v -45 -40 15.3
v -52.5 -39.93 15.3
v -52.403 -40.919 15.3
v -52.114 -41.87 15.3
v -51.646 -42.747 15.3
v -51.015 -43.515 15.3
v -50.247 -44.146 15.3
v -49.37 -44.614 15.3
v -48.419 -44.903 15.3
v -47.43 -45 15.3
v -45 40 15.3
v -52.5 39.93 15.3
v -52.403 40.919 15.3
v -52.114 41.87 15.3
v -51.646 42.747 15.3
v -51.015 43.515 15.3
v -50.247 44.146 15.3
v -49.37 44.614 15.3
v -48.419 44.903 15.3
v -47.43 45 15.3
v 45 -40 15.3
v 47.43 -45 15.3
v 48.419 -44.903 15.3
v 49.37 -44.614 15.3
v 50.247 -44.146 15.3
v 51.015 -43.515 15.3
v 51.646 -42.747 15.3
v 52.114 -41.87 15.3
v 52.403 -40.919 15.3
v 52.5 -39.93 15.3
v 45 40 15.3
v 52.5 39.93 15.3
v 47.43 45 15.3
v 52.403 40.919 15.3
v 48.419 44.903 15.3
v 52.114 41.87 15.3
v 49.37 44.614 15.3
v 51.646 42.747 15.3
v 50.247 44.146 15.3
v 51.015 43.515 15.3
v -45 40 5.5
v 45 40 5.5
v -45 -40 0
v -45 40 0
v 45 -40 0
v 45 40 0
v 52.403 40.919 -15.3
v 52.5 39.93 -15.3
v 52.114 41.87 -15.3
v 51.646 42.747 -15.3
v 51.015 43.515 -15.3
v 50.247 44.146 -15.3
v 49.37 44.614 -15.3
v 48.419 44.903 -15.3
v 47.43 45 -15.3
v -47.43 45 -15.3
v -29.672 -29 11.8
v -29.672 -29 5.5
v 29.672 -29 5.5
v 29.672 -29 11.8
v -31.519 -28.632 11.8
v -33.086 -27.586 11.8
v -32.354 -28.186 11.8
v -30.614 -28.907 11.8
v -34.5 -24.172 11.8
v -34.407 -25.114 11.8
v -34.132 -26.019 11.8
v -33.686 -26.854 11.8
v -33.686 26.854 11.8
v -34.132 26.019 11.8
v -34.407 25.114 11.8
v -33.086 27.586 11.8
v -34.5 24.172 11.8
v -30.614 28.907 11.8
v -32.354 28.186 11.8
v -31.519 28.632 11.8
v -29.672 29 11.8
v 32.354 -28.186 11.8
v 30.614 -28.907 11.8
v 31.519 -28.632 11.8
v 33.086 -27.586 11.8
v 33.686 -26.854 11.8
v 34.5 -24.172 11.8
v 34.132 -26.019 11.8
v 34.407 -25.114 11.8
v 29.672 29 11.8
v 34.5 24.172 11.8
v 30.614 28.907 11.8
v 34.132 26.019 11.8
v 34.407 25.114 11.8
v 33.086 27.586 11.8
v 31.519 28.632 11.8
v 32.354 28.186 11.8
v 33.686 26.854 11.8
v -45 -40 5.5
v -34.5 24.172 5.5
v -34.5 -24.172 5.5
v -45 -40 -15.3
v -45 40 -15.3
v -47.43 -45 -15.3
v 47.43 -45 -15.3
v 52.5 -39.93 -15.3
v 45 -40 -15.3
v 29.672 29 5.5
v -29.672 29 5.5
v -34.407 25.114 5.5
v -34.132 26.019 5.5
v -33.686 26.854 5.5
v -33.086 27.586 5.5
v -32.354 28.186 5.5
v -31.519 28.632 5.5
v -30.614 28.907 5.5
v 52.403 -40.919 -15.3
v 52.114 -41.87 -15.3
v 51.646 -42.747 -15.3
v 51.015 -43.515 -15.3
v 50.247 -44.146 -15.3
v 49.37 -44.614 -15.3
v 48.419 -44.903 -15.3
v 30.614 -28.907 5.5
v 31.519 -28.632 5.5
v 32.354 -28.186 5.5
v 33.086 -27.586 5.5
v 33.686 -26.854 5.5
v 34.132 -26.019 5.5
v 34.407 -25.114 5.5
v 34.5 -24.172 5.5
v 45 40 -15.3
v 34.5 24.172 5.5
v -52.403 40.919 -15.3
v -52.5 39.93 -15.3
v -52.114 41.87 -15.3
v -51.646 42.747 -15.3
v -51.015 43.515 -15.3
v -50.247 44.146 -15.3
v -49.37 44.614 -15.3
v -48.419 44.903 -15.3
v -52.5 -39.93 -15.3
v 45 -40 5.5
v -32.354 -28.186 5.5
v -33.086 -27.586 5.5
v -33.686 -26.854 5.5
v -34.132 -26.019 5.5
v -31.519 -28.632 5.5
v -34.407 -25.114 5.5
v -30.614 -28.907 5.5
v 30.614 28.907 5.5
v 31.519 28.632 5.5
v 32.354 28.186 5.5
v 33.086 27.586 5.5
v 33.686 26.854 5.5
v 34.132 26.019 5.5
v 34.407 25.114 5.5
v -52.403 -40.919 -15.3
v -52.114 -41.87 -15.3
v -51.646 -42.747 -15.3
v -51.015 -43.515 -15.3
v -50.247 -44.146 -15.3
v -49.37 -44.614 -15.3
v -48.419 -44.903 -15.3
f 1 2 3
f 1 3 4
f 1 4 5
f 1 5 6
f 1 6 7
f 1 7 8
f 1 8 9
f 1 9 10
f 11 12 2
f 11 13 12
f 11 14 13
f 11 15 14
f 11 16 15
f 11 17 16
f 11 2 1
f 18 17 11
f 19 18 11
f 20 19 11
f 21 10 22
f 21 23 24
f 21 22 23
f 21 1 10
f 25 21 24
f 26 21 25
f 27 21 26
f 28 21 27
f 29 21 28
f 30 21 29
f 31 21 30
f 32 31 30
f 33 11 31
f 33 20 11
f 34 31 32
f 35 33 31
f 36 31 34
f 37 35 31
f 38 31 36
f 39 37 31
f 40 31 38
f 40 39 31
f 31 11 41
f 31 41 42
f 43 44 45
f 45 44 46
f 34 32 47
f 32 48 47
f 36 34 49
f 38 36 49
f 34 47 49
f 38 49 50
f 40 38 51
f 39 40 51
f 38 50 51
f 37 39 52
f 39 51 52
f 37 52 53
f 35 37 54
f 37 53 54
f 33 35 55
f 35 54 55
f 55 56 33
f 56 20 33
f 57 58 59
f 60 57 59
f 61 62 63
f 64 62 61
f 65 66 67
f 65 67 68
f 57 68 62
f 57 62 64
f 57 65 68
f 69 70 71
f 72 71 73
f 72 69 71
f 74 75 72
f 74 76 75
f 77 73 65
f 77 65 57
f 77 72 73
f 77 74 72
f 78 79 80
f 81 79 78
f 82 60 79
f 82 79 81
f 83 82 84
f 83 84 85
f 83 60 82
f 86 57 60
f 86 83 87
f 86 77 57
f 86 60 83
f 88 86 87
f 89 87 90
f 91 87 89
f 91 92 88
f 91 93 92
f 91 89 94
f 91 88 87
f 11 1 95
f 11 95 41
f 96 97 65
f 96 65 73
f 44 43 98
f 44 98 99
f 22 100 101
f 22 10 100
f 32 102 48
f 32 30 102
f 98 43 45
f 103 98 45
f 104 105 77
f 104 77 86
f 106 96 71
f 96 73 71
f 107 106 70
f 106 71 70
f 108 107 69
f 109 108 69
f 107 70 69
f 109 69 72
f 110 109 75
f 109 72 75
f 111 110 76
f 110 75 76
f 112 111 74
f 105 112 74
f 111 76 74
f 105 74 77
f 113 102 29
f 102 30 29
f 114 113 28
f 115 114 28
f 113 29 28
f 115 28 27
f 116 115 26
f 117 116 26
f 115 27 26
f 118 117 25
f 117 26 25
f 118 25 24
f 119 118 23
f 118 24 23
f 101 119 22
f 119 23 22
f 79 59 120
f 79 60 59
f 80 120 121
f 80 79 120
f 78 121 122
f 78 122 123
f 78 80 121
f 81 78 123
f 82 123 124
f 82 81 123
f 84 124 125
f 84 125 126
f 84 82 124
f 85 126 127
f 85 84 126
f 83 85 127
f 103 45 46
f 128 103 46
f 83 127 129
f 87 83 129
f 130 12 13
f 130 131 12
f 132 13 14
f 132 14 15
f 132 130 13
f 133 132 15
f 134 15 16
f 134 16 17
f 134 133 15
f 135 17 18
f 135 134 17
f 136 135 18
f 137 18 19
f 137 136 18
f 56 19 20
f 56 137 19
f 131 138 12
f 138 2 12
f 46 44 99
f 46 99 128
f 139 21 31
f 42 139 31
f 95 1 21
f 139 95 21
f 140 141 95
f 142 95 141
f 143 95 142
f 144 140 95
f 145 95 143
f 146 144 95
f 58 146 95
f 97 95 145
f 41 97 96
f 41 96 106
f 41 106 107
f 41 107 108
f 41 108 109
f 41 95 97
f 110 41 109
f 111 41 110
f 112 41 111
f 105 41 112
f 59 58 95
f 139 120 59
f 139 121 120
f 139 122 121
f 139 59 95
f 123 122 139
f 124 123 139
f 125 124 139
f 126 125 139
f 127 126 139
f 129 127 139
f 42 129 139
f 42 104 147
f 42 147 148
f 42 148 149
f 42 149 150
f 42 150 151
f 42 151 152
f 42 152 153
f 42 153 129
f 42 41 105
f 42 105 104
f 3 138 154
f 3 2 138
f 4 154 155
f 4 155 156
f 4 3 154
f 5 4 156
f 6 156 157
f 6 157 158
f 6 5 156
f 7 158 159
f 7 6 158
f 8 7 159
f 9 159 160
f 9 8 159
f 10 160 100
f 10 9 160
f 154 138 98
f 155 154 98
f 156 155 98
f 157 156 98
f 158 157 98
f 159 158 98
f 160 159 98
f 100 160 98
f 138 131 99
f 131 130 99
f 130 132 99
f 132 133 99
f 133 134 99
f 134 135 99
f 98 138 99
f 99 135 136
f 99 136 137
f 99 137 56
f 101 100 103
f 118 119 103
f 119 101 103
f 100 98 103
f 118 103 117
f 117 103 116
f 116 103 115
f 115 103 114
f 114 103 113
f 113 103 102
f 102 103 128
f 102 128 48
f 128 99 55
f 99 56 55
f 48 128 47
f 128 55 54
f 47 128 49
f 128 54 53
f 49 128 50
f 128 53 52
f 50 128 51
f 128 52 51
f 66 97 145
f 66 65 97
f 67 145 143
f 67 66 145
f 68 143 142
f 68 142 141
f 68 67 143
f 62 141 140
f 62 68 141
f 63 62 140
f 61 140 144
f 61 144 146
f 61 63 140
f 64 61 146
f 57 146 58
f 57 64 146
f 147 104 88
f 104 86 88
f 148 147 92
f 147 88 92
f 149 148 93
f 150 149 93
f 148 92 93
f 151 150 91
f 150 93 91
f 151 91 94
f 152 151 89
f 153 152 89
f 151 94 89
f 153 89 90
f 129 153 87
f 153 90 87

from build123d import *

# Parameters (mm, degrees)
F0_W     = 105
F0_H     = 90
F0_W_2   = 90
F0_H_2   = 80
F1_DEPTH = 15.3
F2_R     = 5.069848481
F0_W_3   = 69
F0_H_3   = 58
F3_DEPTH = 5.5
F4_DEPTH = 11.8
F5_R     = 4.8284271247


with BuildPart() as f1:
    # F0 (on Top) → F1 (new body, symmetric)
    with BuildSketch(Plane.XY):
        Rectangle(F0_W, F0_H)
        Rectangle(F0_W_2, F0_H_2, mode=Mode.SUBTRACT)
    extrude(amount=F1_DEPTH, both=True)

    # F2
    f2_edges = [f1.edges().sort_by_distance(p)[0] for p in [
        (52.5, -45, 0),
        (-52.5, -45, 0),
        (-52.5, 45, 0),
        (52.5, 45, 0),
    ]]
    fillet(f2_edges, radius=F2_R)

    # F0 (on Top) → F3 (join)
    with BuildSketch(Plane.XY):
        Rectangle(F0_W_2, F0_H_2)
        Rectangle(F0_W_3, F0_H_3, mode=Mode.SUBTRACT)
    extrude(amount=F3_DEPTH)

    # F0 (on Top) → F4 (join)
    with BuildSketch(Plane.XY):
        Rectangle(F0_W_3, F0_H_3)
    extrude(amount=F4_DEPTH)

    # F5
    f5_edges = [f1.edges().sort_by_distance(p)[0] for p in [
        (34.5, -29, 8.65),
        (34.5, 29, 8.65),
        (-34.5, 29, 8.65),
        (-34.5, -29, 8.65),
    ]]
    fillet(f5_edges, radius=F5_R)


solid = f1.part
